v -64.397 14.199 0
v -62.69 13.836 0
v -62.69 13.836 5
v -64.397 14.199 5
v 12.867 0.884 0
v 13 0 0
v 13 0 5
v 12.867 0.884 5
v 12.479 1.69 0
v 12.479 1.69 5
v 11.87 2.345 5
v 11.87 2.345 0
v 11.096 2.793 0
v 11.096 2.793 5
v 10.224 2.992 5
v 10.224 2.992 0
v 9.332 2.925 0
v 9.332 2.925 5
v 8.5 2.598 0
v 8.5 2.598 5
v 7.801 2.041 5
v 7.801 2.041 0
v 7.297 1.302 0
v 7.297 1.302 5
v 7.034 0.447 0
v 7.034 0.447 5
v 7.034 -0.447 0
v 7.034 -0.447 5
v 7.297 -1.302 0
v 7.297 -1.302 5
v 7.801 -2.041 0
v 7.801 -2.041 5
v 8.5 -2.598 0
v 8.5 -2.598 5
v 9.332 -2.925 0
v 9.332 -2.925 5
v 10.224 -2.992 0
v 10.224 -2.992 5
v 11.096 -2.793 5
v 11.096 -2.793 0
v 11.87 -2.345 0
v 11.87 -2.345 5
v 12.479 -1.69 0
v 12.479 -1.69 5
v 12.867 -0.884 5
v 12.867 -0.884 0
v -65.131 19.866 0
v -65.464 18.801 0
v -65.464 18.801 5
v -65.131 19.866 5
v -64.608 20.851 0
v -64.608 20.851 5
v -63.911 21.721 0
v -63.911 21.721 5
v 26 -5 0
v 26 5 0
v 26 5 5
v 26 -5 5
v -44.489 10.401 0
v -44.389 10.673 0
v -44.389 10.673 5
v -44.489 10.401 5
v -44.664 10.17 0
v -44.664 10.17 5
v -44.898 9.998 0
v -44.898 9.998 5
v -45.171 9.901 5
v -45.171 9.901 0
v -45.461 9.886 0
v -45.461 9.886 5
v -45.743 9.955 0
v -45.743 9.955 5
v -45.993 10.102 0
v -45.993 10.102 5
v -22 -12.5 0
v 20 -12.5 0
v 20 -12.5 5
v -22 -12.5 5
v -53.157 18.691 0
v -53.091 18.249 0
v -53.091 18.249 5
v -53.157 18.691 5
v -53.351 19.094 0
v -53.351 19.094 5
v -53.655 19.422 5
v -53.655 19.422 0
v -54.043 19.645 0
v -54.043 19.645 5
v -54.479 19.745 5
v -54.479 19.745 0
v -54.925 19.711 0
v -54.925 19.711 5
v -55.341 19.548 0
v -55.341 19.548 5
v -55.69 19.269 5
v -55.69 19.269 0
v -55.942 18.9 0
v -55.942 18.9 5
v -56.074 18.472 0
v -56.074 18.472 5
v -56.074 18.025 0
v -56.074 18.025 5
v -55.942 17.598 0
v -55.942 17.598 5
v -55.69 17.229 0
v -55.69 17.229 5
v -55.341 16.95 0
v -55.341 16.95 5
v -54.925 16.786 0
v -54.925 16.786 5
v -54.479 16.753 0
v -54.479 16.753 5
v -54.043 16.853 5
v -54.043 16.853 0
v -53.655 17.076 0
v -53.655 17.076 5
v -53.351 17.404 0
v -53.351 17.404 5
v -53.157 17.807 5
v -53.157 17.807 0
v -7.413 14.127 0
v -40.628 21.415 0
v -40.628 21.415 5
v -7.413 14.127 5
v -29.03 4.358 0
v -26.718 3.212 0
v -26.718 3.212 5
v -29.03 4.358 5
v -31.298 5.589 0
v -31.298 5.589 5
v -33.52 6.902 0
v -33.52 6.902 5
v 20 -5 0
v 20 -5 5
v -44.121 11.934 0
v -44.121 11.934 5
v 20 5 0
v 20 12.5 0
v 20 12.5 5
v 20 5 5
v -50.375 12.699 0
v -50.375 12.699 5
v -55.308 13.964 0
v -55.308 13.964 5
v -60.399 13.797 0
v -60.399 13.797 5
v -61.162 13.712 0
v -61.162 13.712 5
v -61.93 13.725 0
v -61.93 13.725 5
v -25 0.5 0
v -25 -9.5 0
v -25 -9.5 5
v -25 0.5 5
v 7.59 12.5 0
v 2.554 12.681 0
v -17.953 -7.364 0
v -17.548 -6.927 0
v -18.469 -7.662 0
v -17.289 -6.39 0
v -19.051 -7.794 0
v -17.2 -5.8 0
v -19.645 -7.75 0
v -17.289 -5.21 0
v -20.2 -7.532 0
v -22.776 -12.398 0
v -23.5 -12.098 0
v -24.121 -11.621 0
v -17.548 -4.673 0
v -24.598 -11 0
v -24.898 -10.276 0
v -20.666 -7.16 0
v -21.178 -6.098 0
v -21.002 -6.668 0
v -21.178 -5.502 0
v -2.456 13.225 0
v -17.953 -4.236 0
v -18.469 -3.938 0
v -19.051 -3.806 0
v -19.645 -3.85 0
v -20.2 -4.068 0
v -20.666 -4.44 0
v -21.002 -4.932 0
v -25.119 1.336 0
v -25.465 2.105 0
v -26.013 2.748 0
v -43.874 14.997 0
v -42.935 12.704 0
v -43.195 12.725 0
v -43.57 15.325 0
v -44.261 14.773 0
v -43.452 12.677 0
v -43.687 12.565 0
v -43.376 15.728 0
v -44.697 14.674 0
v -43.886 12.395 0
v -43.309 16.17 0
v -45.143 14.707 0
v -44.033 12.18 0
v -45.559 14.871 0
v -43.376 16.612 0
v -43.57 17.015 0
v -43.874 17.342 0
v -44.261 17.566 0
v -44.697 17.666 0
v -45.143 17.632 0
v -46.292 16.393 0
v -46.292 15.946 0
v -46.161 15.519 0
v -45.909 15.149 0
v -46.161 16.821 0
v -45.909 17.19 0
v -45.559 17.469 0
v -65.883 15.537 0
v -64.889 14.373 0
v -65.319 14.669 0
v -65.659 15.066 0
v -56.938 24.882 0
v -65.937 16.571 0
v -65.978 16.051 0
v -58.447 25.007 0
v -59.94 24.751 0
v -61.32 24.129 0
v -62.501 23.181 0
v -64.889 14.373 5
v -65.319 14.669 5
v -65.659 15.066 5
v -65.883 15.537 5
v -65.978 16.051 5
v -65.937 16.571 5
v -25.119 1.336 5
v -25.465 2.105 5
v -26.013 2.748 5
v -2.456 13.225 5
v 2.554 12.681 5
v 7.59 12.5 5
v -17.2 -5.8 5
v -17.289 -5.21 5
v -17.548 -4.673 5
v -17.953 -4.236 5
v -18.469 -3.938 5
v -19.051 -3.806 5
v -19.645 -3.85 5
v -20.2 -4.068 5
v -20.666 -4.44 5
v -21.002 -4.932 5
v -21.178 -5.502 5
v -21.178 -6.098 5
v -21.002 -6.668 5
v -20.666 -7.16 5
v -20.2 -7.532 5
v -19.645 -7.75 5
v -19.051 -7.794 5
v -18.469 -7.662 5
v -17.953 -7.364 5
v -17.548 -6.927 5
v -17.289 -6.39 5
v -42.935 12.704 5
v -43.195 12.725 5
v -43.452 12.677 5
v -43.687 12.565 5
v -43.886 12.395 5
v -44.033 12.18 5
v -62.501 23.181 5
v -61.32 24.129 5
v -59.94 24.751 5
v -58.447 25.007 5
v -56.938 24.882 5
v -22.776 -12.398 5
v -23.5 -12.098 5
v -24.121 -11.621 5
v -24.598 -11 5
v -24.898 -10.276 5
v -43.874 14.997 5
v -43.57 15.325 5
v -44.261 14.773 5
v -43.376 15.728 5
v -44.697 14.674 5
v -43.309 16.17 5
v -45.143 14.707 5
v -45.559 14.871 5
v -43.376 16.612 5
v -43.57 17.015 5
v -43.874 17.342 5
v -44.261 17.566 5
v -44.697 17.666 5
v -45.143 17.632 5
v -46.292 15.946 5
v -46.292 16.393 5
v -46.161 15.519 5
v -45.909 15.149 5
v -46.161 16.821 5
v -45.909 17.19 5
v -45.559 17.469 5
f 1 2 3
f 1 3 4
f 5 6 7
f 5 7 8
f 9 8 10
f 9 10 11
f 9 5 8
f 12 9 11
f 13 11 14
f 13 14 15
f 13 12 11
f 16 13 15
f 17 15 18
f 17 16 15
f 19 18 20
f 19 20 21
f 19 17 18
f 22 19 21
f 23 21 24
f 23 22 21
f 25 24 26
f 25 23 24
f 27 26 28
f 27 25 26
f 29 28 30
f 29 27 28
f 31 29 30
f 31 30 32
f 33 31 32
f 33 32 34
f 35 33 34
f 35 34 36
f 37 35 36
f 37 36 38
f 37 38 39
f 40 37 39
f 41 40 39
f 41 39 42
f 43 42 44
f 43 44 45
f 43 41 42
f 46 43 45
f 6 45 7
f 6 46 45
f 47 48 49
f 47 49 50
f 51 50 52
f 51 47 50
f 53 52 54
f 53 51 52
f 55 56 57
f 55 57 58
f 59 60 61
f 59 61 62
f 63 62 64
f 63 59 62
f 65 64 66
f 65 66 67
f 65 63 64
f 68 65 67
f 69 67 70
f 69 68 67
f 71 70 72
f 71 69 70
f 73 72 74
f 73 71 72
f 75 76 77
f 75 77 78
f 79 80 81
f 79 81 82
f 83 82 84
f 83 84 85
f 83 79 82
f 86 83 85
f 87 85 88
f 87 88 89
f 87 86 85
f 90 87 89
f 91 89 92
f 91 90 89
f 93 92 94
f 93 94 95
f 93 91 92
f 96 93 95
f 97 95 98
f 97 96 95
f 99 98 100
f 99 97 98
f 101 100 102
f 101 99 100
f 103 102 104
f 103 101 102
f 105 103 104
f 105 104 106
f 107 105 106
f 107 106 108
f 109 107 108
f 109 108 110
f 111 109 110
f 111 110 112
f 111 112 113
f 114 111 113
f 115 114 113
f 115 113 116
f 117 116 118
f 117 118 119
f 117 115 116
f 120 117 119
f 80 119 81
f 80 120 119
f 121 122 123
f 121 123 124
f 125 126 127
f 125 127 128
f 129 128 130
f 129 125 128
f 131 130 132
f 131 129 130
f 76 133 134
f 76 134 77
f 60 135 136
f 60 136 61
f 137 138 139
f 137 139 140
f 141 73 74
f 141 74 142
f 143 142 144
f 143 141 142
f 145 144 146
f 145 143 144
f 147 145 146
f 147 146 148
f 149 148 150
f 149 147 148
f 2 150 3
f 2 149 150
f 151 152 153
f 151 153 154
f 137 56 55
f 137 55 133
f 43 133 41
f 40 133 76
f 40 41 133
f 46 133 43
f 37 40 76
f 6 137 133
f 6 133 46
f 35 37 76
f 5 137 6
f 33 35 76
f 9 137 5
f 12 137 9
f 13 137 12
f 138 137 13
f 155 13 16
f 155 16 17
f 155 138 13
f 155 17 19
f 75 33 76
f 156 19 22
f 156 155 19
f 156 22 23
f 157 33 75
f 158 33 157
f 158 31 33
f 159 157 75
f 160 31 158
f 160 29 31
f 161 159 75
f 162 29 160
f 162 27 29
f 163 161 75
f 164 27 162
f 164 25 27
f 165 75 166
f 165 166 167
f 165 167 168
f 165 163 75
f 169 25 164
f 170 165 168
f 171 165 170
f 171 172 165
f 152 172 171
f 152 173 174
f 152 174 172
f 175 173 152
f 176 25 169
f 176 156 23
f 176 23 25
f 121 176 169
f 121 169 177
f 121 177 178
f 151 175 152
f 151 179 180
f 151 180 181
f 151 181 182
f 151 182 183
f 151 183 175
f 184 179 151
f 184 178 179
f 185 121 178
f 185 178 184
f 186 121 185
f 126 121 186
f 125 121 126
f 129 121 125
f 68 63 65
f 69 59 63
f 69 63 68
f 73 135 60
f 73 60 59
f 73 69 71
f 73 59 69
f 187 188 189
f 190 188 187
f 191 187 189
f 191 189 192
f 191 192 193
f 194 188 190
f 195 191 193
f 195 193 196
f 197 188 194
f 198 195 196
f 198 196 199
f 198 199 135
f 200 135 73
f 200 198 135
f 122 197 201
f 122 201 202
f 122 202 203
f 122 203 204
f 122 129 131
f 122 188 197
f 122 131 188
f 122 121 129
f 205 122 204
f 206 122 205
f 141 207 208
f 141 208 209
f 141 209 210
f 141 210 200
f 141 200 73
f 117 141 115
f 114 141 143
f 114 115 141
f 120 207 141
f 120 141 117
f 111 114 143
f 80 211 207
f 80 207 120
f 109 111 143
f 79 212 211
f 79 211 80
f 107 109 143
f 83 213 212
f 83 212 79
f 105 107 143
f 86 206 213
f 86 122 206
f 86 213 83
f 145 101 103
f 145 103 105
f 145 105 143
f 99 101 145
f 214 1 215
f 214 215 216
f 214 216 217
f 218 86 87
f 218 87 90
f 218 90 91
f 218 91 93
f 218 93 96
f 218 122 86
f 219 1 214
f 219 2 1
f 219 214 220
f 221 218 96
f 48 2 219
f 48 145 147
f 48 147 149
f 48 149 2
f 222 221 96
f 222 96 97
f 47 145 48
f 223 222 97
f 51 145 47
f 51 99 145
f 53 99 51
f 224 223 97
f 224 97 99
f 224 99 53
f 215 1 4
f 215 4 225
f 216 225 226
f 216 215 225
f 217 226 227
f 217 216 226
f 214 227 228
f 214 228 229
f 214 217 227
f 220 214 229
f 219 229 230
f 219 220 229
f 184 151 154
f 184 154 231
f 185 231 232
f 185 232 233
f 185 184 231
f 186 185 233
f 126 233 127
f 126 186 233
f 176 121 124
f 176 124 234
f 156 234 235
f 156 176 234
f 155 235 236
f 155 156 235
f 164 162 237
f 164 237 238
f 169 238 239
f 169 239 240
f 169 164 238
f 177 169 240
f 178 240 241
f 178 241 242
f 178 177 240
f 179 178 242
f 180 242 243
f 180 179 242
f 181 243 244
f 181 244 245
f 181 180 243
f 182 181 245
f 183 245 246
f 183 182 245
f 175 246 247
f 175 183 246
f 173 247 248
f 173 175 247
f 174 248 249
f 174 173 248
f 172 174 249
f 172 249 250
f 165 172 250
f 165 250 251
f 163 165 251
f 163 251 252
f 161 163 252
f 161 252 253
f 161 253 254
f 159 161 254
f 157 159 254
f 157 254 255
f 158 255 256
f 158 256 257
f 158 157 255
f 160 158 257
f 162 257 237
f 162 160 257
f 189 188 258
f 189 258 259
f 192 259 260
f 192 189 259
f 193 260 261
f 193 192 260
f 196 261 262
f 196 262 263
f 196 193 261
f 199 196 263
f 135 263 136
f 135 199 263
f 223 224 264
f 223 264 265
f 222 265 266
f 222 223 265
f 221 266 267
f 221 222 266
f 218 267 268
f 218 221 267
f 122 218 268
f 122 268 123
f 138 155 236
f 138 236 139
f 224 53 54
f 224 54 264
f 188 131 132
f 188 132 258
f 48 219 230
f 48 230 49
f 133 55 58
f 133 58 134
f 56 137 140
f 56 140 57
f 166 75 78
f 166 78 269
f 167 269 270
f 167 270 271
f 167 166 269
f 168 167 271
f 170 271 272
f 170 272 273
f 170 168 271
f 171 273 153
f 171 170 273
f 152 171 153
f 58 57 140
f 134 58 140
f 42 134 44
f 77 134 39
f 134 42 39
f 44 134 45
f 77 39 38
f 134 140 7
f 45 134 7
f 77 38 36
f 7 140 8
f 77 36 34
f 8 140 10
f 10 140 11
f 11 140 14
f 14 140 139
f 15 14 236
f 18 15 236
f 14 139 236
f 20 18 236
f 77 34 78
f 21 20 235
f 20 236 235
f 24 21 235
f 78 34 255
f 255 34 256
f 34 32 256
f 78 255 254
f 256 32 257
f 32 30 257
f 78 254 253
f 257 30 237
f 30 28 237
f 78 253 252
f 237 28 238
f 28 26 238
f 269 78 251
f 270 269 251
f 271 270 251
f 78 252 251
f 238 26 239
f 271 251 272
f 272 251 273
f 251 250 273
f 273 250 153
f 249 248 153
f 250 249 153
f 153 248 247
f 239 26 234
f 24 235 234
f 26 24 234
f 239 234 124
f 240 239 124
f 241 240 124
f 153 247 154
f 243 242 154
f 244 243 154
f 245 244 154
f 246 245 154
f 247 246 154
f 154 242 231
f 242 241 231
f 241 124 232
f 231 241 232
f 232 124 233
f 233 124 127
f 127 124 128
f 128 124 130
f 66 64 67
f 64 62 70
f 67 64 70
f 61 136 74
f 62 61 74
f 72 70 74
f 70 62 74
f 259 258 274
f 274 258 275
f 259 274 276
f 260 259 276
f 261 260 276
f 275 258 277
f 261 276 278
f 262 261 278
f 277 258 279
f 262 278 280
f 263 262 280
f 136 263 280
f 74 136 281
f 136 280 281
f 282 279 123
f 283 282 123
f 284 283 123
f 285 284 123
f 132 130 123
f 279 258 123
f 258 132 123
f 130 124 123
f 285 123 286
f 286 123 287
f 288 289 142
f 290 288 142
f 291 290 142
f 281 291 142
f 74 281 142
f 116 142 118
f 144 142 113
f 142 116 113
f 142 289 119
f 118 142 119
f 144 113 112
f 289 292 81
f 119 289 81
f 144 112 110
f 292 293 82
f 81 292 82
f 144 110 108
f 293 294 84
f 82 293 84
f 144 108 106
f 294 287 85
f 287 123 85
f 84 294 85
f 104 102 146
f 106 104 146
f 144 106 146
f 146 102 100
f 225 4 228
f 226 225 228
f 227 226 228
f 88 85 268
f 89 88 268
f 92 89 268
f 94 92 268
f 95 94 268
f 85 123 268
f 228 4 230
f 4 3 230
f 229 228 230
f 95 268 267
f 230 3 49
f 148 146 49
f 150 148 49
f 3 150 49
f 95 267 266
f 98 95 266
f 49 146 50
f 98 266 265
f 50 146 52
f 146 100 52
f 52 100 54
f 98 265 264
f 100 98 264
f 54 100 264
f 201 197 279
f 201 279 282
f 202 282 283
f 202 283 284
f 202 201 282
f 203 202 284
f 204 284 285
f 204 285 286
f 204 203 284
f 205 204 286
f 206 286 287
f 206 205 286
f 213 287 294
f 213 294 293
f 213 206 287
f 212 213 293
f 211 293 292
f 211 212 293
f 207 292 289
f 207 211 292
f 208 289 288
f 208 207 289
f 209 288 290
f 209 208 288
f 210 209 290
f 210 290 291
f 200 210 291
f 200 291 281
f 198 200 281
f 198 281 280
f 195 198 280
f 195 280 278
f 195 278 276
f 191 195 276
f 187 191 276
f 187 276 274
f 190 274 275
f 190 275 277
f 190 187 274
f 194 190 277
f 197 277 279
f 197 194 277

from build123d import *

# Parameters (mm, degrees)
SKETCH1_R           = 3
SKETCH1_R_2         = 2
SKETCH1_R_3         = 1.5
BOSS_EXTRUDE1_DEPTH = 5


with BuildPart() as part:
    # Sketch1 → Boss-Extrude1 (new body)
    with BuildSketch(Plane.XY):
        with BuildLine():
            Line((7.589765397, 12.5), (20, 12.5))
            Line((20, 12.5), (20, 5))
            Line((20, 5), (26, 5))
            Line((26, 5), (26, -5))
            Line((26, -5), (20, -5))
            Line((20, -5), (20, -12.5))
            Line((20, -12.5), (0, -12.5))
            Line((0, -12.5), (-22, -12.5))
            ThreePointArc((-22, -12.5), (-24.121320344, -11.621320344), (-25, -9.5))
            Line((-25, -9.5), (-25, 0.5))
            ThreePointArc((-25, 0.5), (-25.465496735, 2.105083549), (-26.717528799, 3.212059663))
            ThreePointArc((-26.717528799, 3.212059663), (-30.169638016, 4.962862371), (-33.519694565, 6.901802618))
            Line((-33.519694565, 6.901802618), (-42.934572397, 12.704217168))
            ThreePointArc((-42.934572397, 12.704217168), (-43.687123123, 12.564740135), (-44.120631689, 11.933981258))
            Line((-44.120631689, 11.933981258), (-44.388558942, 10.673482635))
            ThreePointArc((-44.388558942, 10.673482635), (-45.031133401, 9.939380171), (-45.993109182, 10.101894657))
            ThreePointArc((-45.993109182, 10.101894657), (-52.796527237, 13.506575009), (-60.398778904, 13.796601081))
            ThreePointArc((-60.398778904, 13.796601081), (-61.546162789, 13.706067739), (-62.68972312, 13.836282296))
            Line((-62.68972312, 13.836282296), (-64.396986027, 14.199172229))
            ThreePointArc((-64.396986027, 14.199172229), (-65.658503782, 15.066189361), (-65.937457847, 16.571290812))
            Line((-65.937457847, 16.571290812), (-65.463517392, 18.801005349))
            ThreePointArc((-65.463517392, 18.801005349), (-64.892317345, 20.370364581), (-63.91067059, 21.721485427))
            Line((-63.91067059, 21.721485427), (-62.501386729, 23.180841584))
            ThreePointArc((-62.501386729, 23.180841584), (-59.939578156, 24.750719897), (-56.937877783, 24.881776966))
            Line((-56.937877783, 24.881776966), (-40.62810218, 21.415027142))
            Line((-40.62810218, 21.415027142), (-7.413387902, 14.126720197))
            ThreePointArc((-7.413387902, 14.126720197), (0.044223211, 12.90786831), (7.589765397, 12.5))
        make_face()
        with Locations((10, 0)):
            Circle(SKETCH1_R, mode=Mode.SUBTRACT)
        with Locations((-19.2, -5.8)):
            Circle(SKETCH1_R_2, mode=Mode.SUBTRACT)
        with Locations((-54.590724376, 18.248830539)):
            Circle(SKETCH1_R_3, mode=Mode.SUBTRACT)
        with Locations((-44.809248369, 16.169713631)):
            Circle(SKETCH1_R_3, mode=Mode.SUBTRACT)
    extrude(amount=BOSS_EXTRUDE1_DEPTH)


solid = part.part
